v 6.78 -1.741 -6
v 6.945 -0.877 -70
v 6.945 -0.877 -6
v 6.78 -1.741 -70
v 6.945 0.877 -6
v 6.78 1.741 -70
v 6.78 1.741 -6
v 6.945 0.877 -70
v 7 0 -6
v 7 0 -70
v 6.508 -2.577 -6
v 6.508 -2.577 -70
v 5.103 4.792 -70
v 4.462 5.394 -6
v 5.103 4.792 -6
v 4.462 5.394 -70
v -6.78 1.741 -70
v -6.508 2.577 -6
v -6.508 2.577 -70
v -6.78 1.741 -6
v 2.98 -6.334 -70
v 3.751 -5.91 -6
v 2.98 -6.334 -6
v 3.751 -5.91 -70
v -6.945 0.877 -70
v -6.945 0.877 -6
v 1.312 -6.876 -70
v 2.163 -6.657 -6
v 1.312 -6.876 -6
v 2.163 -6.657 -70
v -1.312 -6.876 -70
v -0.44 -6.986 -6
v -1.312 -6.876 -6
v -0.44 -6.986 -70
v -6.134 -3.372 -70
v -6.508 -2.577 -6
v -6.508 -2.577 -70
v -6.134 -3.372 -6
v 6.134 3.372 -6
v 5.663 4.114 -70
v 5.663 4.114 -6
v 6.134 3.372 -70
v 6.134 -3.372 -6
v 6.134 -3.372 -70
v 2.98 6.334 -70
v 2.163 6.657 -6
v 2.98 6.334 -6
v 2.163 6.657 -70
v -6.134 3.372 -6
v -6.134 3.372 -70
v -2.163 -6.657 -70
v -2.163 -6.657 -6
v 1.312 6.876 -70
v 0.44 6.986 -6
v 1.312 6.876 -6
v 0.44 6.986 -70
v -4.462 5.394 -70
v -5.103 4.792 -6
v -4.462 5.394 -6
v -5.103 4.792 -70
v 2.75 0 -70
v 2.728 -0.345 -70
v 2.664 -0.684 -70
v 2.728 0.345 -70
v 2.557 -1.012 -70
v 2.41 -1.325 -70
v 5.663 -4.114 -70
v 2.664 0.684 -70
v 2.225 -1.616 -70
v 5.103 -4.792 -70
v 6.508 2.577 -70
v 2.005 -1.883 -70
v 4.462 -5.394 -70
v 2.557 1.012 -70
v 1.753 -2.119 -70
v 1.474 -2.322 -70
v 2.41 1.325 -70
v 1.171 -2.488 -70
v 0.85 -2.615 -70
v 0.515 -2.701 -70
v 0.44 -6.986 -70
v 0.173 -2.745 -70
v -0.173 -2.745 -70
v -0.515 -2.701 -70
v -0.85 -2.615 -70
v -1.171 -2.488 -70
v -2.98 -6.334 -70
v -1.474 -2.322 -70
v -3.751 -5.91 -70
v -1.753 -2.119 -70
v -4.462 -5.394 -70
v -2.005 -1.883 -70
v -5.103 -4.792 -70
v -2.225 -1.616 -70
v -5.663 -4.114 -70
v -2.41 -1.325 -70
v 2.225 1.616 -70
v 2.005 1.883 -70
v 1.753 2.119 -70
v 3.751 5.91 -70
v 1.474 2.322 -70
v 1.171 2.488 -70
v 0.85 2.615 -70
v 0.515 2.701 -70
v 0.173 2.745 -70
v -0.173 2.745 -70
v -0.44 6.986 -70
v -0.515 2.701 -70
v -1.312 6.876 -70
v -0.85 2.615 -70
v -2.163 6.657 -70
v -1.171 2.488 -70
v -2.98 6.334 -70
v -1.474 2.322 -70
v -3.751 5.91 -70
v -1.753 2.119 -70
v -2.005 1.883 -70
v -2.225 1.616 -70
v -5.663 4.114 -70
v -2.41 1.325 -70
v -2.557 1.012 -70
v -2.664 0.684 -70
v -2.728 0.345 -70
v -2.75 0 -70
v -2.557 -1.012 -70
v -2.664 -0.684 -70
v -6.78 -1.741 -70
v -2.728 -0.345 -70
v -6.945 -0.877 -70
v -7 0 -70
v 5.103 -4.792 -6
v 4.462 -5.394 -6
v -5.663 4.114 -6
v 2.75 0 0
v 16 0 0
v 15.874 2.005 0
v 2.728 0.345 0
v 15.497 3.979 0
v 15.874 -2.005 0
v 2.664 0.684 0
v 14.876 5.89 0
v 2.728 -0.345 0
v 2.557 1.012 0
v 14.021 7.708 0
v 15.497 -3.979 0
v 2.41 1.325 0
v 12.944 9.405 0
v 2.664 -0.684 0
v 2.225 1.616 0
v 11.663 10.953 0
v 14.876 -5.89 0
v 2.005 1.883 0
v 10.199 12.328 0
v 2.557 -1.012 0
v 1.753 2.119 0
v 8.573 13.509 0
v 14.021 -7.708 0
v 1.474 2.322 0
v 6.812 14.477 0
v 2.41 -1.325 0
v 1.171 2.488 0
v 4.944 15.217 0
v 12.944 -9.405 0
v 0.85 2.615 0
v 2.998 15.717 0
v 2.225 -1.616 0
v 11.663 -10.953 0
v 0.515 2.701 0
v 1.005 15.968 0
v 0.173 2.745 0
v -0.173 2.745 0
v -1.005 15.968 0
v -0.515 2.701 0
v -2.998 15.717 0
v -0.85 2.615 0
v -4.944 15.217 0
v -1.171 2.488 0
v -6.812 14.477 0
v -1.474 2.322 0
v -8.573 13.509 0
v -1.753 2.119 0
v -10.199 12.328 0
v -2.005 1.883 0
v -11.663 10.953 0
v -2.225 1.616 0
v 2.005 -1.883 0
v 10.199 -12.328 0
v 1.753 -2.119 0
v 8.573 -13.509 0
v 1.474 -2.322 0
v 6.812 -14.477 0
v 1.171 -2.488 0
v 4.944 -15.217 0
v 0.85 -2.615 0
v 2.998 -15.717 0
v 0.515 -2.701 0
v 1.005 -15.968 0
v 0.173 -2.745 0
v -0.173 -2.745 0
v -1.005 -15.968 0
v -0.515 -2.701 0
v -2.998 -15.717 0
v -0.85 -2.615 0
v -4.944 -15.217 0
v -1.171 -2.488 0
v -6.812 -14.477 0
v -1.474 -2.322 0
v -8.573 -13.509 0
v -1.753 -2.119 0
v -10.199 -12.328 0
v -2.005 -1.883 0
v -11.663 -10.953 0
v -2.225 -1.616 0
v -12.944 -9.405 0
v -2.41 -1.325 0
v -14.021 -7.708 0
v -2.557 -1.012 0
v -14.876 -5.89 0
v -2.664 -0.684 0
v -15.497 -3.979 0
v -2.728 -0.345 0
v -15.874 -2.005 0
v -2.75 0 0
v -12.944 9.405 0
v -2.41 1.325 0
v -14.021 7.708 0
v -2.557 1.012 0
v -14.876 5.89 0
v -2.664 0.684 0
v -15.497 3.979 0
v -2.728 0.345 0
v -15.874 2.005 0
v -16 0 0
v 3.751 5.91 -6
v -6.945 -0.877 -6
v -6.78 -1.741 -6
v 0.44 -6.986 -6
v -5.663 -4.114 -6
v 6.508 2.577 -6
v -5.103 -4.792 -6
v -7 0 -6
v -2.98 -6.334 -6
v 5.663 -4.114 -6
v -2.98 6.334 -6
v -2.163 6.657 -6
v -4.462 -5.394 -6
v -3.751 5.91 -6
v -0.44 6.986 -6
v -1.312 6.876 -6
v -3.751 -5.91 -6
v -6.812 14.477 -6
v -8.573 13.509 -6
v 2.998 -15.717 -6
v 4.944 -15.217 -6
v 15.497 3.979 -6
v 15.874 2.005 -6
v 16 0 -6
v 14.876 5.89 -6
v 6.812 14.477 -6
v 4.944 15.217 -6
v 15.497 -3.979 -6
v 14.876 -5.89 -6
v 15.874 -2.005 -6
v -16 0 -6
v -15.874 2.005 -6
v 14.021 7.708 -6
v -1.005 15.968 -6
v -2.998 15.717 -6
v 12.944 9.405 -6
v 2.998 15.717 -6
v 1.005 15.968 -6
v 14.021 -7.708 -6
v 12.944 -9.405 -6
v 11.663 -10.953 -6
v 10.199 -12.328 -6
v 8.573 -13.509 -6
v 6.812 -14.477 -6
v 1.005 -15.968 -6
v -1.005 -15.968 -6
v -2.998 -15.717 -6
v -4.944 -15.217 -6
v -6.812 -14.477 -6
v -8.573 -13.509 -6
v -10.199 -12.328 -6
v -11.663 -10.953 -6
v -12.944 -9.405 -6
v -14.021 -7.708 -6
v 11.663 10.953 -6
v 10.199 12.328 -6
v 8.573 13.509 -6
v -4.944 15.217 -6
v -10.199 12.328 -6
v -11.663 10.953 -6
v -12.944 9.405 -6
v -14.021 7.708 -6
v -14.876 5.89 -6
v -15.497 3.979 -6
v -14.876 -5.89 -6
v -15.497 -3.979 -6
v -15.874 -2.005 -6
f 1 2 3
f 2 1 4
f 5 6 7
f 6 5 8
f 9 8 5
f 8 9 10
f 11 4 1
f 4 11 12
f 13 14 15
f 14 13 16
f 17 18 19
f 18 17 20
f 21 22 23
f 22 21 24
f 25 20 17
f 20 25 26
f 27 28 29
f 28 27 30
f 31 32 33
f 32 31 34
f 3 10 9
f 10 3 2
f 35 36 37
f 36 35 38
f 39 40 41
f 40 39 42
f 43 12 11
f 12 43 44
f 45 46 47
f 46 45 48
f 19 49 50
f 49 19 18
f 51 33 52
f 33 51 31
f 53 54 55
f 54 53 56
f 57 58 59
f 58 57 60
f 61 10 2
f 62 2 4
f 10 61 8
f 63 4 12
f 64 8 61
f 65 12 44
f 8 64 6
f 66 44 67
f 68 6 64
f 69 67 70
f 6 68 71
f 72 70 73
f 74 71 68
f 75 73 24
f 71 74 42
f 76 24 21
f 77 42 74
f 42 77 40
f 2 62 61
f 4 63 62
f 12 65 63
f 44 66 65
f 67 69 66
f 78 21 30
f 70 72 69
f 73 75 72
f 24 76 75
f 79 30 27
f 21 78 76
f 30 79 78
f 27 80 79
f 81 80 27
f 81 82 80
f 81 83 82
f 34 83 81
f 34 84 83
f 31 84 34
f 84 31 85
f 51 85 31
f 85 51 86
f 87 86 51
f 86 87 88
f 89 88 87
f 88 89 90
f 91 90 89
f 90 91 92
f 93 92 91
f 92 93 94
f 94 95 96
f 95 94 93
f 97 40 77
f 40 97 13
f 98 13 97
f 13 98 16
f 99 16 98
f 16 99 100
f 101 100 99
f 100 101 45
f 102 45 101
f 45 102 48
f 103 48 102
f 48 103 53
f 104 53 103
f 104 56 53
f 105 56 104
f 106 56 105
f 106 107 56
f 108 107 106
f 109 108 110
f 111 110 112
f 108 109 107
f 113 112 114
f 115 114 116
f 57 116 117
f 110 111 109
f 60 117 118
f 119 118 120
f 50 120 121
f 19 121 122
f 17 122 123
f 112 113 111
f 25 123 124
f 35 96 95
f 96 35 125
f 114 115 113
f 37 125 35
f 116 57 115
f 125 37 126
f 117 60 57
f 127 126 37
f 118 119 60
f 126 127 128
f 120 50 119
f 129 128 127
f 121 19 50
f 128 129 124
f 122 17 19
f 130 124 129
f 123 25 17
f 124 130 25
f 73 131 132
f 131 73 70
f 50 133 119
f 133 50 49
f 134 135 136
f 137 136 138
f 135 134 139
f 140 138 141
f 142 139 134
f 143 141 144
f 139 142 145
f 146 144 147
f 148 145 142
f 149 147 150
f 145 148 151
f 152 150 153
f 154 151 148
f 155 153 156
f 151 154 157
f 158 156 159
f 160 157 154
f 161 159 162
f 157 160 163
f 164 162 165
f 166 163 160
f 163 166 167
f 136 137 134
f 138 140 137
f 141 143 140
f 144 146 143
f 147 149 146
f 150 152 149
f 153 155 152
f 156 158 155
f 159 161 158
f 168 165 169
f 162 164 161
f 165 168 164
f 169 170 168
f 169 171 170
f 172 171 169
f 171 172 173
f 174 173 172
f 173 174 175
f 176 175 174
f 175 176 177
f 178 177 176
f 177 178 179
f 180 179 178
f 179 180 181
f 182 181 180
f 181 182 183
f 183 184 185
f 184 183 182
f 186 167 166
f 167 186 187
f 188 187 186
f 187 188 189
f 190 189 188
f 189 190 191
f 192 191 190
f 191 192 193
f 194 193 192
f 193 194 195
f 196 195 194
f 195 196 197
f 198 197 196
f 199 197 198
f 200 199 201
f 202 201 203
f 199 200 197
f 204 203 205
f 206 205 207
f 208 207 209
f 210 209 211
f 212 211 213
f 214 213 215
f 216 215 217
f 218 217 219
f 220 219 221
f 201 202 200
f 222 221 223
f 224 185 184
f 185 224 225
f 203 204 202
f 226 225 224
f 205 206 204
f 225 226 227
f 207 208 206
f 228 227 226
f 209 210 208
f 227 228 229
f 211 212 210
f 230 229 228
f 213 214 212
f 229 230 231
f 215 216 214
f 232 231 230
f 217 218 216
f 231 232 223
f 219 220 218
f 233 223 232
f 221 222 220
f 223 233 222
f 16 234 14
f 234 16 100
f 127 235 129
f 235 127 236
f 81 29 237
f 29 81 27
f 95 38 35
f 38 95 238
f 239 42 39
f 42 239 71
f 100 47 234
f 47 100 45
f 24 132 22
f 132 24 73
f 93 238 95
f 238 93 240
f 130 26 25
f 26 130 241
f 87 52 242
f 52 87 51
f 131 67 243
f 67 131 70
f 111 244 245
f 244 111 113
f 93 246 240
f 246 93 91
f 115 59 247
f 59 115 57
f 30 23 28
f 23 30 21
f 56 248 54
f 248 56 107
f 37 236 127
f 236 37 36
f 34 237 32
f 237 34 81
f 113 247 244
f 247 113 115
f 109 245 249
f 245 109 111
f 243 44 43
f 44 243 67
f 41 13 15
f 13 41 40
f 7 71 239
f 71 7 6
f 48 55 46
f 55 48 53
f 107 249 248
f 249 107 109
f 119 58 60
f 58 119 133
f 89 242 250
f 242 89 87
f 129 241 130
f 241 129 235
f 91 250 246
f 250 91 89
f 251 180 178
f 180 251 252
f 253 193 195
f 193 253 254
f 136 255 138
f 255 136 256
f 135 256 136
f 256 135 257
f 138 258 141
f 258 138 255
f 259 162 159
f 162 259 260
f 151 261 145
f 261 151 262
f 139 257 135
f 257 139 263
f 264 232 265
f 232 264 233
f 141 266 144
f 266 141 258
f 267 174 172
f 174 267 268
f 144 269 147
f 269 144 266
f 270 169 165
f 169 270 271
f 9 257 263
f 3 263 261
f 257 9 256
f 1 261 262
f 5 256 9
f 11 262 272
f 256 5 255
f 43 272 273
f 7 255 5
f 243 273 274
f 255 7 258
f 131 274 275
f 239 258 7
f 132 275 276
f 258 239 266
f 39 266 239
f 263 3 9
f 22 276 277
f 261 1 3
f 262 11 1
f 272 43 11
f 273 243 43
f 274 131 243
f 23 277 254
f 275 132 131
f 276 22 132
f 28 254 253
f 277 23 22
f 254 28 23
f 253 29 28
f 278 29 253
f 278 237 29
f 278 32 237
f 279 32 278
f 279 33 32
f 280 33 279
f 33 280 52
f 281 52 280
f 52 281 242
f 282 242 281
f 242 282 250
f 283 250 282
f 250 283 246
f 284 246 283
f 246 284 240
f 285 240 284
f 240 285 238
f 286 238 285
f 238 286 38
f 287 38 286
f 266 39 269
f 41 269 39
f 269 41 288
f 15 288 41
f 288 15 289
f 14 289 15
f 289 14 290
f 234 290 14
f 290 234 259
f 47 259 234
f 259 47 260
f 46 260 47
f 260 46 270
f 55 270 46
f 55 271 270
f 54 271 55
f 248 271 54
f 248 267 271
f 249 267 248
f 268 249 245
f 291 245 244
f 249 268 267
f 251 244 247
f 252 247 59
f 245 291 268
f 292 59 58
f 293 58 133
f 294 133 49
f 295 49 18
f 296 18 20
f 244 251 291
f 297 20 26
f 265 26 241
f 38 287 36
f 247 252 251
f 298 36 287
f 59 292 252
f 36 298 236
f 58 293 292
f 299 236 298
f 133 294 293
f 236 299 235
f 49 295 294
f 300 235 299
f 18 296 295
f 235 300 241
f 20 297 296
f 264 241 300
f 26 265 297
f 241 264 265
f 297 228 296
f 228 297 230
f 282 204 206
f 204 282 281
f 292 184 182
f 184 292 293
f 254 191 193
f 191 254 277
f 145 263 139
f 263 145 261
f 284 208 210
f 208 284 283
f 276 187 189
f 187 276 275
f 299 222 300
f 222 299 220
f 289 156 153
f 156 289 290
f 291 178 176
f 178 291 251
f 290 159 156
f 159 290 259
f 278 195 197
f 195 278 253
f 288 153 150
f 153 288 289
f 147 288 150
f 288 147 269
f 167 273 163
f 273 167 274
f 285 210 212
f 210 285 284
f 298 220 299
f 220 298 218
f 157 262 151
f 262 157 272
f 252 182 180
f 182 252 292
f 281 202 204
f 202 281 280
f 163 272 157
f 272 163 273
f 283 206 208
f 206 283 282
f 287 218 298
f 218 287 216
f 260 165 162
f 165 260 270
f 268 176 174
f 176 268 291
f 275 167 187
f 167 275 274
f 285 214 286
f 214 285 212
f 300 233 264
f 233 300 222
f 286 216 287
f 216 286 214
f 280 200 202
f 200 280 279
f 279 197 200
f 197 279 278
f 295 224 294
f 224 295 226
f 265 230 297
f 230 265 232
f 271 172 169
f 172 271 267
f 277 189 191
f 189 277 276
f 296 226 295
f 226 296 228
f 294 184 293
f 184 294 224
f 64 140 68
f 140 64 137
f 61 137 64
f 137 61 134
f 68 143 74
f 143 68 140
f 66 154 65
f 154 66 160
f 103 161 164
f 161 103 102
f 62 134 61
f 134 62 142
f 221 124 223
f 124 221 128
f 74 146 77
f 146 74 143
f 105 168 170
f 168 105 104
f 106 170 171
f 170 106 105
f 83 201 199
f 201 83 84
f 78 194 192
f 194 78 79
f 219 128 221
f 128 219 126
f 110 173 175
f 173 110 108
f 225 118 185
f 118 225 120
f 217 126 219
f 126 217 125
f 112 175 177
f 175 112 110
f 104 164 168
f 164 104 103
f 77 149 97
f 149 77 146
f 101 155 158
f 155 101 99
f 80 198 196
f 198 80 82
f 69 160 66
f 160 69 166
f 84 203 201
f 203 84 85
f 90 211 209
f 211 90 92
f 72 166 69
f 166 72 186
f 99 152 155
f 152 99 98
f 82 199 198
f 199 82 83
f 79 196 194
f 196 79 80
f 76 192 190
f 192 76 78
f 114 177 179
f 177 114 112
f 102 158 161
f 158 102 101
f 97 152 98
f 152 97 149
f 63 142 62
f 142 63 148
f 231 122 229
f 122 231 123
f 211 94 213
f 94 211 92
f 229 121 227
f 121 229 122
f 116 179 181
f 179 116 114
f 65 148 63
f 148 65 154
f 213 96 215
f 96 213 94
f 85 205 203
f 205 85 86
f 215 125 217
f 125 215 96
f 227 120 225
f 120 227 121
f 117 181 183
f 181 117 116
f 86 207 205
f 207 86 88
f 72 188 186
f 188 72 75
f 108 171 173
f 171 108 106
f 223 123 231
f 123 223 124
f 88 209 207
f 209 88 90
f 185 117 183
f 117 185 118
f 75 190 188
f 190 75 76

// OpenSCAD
$fn = 50;


difference() {
	union() {
		translate(v = [0, 0, -70.0000000000]) {
			cylinder(h = 70, r = 7.0000000000);
		}
		translate(v = [0, 0, -6.0000000000]) {
			cylinder(h = 6, r = 16.0000000000);
		}
	}
	union() {
		#translate(v = [0, 0, -70]) {
			cylinder(h = 70, r = 2.7500000000);
		}
	}
}
